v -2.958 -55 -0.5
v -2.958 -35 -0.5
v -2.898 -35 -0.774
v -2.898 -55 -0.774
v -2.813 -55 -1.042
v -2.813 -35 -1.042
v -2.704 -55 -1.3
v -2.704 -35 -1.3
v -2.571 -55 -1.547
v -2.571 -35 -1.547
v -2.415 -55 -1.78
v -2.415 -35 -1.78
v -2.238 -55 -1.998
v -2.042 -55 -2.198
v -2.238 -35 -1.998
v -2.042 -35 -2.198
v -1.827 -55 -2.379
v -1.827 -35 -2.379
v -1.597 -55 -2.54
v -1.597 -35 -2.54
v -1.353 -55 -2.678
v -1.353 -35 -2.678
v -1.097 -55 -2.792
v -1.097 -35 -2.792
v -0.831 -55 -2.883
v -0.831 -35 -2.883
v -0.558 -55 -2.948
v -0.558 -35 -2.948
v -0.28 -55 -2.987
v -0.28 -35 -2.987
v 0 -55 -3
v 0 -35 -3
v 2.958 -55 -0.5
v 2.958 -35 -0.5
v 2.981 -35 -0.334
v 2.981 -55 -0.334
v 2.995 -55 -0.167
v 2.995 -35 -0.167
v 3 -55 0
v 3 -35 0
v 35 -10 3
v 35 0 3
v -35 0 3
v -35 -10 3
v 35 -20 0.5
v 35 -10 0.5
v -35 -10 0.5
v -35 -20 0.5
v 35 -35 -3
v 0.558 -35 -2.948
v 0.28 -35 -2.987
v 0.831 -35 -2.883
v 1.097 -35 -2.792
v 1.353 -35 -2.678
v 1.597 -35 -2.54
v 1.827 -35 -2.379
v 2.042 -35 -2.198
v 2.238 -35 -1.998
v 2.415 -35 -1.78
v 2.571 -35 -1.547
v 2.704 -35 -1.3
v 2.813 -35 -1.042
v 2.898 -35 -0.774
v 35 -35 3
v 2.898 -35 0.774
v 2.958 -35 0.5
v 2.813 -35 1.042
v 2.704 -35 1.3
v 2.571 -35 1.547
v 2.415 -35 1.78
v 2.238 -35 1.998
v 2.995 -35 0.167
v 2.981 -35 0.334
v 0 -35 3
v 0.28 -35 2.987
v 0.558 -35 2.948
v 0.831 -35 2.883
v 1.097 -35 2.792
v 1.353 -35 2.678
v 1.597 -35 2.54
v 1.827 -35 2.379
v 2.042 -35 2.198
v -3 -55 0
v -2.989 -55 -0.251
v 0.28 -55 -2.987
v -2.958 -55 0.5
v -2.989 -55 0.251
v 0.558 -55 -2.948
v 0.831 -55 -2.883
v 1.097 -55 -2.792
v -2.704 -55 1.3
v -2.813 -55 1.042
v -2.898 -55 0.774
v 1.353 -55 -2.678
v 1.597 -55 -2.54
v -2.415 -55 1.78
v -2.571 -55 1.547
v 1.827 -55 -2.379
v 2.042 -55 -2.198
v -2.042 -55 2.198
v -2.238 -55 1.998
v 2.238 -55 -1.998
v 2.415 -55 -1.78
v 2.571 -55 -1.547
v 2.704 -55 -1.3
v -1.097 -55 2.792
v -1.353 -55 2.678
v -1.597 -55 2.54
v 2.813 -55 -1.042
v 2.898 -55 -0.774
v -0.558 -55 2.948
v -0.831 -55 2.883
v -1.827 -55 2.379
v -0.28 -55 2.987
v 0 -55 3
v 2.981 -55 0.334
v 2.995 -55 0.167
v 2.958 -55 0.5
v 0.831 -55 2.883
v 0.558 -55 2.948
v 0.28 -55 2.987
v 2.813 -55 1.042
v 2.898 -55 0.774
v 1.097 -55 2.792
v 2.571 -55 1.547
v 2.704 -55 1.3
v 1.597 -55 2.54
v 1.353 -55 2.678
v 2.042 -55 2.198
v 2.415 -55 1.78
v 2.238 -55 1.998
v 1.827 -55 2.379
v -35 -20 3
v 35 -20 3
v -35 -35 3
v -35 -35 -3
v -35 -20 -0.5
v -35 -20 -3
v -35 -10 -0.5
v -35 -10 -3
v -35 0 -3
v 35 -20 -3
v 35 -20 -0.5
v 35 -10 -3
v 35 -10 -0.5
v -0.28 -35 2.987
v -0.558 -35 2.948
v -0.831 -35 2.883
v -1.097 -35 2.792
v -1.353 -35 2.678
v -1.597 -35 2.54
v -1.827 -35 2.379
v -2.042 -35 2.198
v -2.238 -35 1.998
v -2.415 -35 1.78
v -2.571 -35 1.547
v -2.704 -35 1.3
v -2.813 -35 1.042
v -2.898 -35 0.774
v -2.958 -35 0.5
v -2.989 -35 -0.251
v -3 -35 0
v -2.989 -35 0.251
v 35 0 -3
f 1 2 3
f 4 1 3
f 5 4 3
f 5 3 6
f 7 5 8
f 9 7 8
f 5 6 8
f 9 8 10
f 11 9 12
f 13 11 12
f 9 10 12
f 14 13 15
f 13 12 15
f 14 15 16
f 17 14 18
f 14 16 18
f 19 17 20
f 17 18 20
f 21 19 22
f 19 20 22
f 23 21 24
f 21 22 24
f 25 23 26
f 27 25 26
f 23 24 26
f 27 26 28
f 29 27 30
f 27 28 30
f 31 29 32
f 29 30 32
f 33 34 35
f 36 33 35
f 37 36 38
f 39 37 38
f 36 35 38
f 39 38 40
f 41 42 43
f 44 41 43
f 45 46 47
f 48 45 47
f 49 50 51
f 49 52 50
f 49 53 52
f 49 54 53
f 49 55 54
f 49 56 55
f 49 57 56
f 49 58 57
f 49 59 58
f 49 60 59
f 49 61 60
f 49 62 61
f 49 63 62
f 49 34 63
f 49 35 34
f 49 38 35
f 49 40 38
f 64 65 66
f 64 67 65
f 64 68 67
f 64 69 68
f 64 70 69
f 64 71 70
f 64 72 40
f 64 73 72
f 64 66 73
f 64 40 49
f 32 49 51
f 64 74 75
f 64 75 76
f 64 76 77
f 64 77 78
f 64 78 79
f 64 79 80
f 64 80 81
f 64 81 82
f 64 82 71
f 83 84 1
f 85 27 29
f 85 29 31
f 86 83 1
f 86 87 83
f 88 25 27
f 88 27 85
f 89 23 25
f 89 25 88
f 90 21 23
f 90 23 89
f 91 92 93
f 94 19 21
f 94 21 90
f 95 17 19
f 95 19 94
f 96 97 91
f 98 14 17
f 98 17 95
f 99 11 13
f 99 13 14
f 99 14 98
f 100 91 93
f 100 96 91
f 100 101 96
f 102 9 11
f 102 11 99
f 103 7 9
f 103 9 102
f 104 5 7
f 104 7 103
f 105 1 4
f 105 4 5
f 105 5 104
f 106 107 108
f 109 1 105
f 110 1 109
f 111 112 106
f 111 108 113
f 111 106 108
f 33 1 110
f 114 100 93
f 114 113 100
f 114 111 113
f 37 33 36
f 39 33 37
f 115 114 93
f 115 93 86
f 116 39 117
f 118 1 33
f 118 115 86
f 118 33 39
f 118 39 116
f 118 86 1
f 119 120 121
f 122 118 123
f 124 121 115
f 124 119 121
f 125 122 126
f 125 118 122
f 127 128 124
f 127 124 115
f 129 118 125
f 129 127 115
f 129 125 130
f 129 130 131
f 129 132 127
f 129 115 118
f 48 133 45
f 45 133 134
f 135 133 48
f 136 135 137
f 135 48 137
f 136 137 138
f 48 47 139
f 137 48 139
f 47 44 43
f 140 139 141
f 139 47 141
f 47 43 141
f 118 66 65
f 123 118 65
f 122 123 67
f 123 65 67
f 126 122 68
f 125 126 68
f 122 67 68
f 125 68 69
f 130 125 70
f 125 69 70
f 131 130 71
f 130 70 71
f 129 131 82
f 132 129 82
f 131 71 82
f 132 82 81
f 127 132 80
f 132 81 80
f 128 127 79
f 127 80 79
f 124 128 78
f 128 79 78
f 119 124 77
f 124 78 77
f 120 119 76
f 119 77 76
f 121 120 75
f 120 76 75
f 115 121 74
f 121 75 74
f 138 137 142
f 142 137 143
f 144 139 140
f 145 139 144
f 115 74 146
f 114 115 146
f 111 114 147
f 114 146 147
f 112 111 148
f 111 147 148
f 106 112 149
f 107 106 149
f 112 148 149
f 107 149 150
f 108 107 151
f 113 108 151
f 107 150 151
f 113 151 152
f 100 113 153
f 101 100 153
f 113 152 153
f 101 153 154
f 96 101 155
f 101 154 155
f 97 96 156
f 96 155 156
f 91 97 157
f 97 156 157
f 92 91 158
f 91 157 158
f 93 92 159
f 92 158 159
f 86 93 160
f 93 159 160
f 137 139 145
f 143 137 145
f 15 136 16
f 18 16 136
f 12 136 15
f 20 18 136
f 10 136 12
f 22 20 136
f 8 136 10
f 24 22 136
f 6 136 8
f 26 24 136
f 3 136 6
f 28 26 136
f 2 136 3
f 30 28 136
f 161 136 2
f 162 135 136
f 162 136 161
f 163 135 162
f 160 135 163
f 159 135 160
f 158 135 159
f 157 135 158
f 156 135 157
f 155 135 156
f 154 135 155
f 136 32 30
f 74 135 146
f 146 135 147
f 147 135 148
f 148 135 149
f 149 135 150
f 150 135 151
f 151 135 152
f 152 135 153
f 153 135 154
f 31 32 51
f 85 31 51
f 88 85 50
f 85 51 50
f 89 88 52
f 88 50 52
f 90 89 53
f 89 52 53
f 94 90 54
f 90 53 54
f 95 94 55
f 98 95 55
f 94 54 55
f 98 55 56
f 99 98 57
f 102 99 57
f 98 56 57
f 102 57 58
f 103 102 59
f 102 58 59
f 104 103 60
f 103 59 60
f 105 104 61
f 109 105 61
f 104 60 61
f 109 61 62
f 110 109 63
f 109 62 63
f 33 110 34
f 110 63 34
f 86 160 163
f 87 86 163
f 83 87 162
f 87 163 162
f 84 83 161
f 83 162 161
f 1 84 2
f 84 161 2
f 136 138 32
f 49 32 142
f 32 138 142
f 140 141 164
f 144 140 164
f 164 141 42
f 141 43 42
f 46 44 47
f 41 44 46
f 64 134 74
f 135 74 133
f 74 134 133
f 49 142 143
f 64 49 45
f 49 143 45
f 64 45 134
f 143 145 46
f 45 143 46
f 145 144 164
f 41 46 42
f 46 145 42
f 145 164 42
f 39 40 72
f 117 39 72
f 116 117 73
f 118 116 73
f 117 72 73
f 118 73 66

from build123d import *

# Parameters (mm, degrees)
F1_DEPTH = 10
F2_START = 10
F2_DEPTH = 10
F3_START = 20
F3_DEPTH = 15
F4_START = 35
F4_DEPTH = 20


with BuildPart() as f1:
    # F0 (on Front) → F1 (new body)
    with BuildSketch(Plane.XZ):
        with BuildLine():
            Line((1.12e-08, 3), (-35, 3))
            Line((-35, 3), (-35, 0.5))
            Line((-35, 0.5), (-2.9580398915, 0.5))
            ThreePointArc((-2.9580398915, 0.5), (-1.9364916688, 2.2912878511), (1.12e-08, 3))
        make_face()
        with BuildLine():
            Line((-2.9580398915, 0.5), (-35, 0.5))
            Line((-35, 0.5), (-35, -0.5))
            Line((-35, -0.5), (-2.9580398915, -0.5))
            ThreePointArc((-2.9580398915, -0.5), (-3, 0), (-2.9580398915, 0.5))
        make_face()
        with BuildLine():
            Line((-2.9580398915, -0.5), (-35, -0.5))
            Line((-35, -0.5), (-35, -3))
            Line((-35, -3), (1.44e-08, -3))
            ThreePointArc((1.44e-08, -3), (-1.9364916676, -2.2912878521), (-2.9580398915, -0.5))
        make_face()
        with BuildLine():
            Line((2.9580398915, -0.5), (-2.9580398915, -0.5))
            ThreePointArc((-2.9580398915, -0.5), (-1.9364916676, -2.2912878521), (1.44e-08, -3))
            ThreePointArc((1.44e-08, -3), (1.9364916786, -2.2912878428), (2.9580398915, -0.5))
        make_face()
        with BuildLine():
            ThreePointArc((2.9580398915, 0.5), (1.9364916774, 2.2912878439), (1.12e-08, 3))
            ThreePointArc((1.12e-08, 3), (-1.9364916688, 2.2912878511), (-2.9580398915, 0.5))
            Line((-2.9580398915, 0.5), (2.9580398915, 0.5))
        make_face()
        with BuildLine():
            Line((35, 3), (1.12e-08, 3))
            ThreePointArc((1.12e-08, 3), (1.9364916774, 2.2912878439), (2.9580398915, 0.5))
            Line((2.9580398915, 0.5), (35, 0.5))
            Line((35, 0.5), (35, 3))
        make_face()
        with BuildLine():
            Line((35, 0.5), (2.9580398915, 0.5))
            ThreePointArc((2.9580398915, 0.5), (2.9894915684, 0.2508787808), (3, 0))
            ThreePointArc((3, 0), (2.9894915684, -0.2508787808), (2.9580398915, -0.5))
            Line((2.9580398915, -0.5), (35, -0.5))
            Line((35, -0.5), (35, 0.5))
        make_face()
        with BuildLine():
            Line((35, -3), (35, -0.5))
            Line((35, -0.5), (2.9580398915, -0.5))
            ThreePointArc((2.9580398915, -0.5), (1.9364916786, -2.2912878428), (1.44e-08, -3))
            Line((1.44e-08, -3), (35, -3))
        make_face()
        with BuildLine():
            ThreePointArc((3, 0), (2.9894915684, 0.2508787808), (2.9580398915, 0.5))
            Line((2.9580398915, 0.5), (-2.9580398915, 0.5))
            ThreePointArc((-2.9580398915, 0.5), (-3, 0), (-2.9580398915, -0.5))
            Line((-2.9580398915, -0.5), (2.9580398915, -0.5))
            ThreePointArc((2.9580398915, -0.5), (2.9894915684, -0.2508787808), (3, 0))
        make_face()
    extrude(amount=F1_DEPTH)

    # F0 (on Front) → F2 (join)
    with BuildSketch(Plane.XZ.offset(F2_START)):
        with BuildLine():
            Line((-2.9580398915, 0.5), (-35, 0.5))
            Line((-35, 0.5), (-35, -0.5))
            Line((-35, -0.5), (-2.9580398915, -0.5))
            ThreePointArc((-2.9580398915, -0.5), (-3, 0), (-2.9580398915, 0.5))
        make_face()
        with BuildLine():
            ThreePointArc((3, 0), (2.9894915684, 0.2508787808), (2.9580398915, 0.5))
            Line((2.9580398915, 0.5), (-2.9580398915, 0.5))
            ThreePointArc((-2.9580398915, 0.5), (-3, 0), (-2.9580398915, -0.5))
            Line((-2.9580398915, -0.5), (2.9580398915, -0.5))
            ThreePointArc((2.9580398915, -0.5), (2.9894915684, -0.2508787808), (3, 0))
        make_face()
        with BuildLine():
            Line((35, 0.5), (2.9580398915, 0.5))
            ThreePointArc((2.9580398915, 0.5), (2.9894915684, 0.2508787808), (3, 0))
            ThreePointArc((3, 0), (2.9894915684, -0.2508787808), (2.9580398915, -0.5))
            Line((2.9580398915, -0.5), (35, -0.5))
            Line((35, -0.5), (35, 0.5))
        make_face()
    extrude(amount=F2_DEPTH)

    # F0 (on Front) → F3 (join)
    with BuildSketch(Plane.XZ.offset(F3_START)):
        with BuildLine():
            Line((35, 3), (1.12e-08, 3))
            ThreePointArc((1.12e-08, 3), (1.9364916774, 2.2912878439), (2.9580398915, 0.5))
            Line((2.9580398915, 0.5), (35, 0.5))
            Line((35, 0.5), (35, 3))
        make_face()
        with BuildLine():
            Line((35, 0.5), (2.9580398915, 0.5))
            ThreePointArc((2.9580398915, 0.5), (2.9894915684, 0.2508787808), (3, 0))
            ThreePointArc((3, 0), (2.9894915684, -0.2508787808), (2.9580398915, -0.5))
            Line((2.9580398915, -0.5), (35, -0.5))
            Line((35, -0.5), (35, 0.5))
        make_face()
        with BuildLine():
            Line((35, -3), (35, -0.5))
            Line((35, -0.5), (2.9580398915, -0.5))
            ThreePointArc((2.9580398915, -0.5), (1.9364916786, -2.2912878428), (1.44e-08, -3))
            Line((1.44e-08, -3), (35, -3))
        make_face()
        with BuildLine():
            Line((-2.9580398915, -0.5), (-35, -0.5))
            Line((-35, -0.5), (-35, -3))
            Line((-35, -3), (1.44e-08, -3))
            ThreePointArc((1.44e-08, -3), (-1.9364916676, -2.2912878521), (-2.9580398915, -0.5))
        make_face()
        with BuildLine():
            Line((1.12e-08, 3), (-35, 3))
            Line((-35, 3), (-35, 0.5))
            Line((-35, 0.5), (-2.9580398915, 0.5))
            ThreePointArc((-2.9580398915, 0.5), (-1.9364916688, 2.2912878511), (1.12e-08, 3))
        make_face()
        with BuildLine():
            Line((-2.9580398915, 0.5), (-35, 0.5))
            Line((-35, 0.5), (-35, -0.5))
            Line((-35, -0.5), (-2.9580398915, -0.5))
            ThreePointArc((-2.9580398915, -0.5), (-3, 0), (-2.9580398915, 0.5))
        make_face()
        with BuildLine():
            ThreePointArc((2.9580398915, 0.5), (1.9364916774, 2.2912878439), (1.12e-08, 3))
            ThreePointArc((1.12e-08, 3), (-1.9364916688, 2.2912878511), (-2.9580398915, 0.5))
            Line((-2.9580398915, 0.5), (2.9580398915, 0.5))
        make_face()
        with BuildLine():
            ThreePointArc((3, 0), (2.9894915684, 0.2508787808), (2.9580398915, 0.5))
            Line((2.9580398915, 0.5), (-2.9580398915, 0.5))
            ThreePointArc((-2.9580398915, 0.5), (-3, 0), (-2.9580398915, -0.5))
            Line((-2.9580398915, -0.5), (2.9580398915, -0.5))
            ThreePointArc((2.9580398915, -0.5), (2.9894915684, -0.2508787808), (3, 0))
        make_face()
        with BuildLine():
            Line((2.9580398915, -0.5), (-2.9580398915, -0.5))
            ThreePointArc((-2.9580398915, -0.5), (-1.9364916676, -2.2912878521), (1.44e-08, -3))
            ThreePointArc((1.44e-08, -3), (1.9364916786, -2.2912878428), (2.9580398915, -0.5))
        make_face()
    extrude(amount=F3_DEPTH)

    # F0 (on Front) → F4 (join)
    with BuildSketch(Plane.XZ.offset(F4_START)):
        with BuildLine():
            Line((2.9580398915, -0.5), (-2.9580398915, -0.5))
            ThreePointArc((-2.9580398915, -0.5), (-1.9364916676, -2.2912878521), (1.44e-08, -3))
            ThreePointArc((1.44e-08, -3), (1.9364916786, -2.2912878428), (2.9580398915, -0.5))
        make_face()
        with BuildLine():
            ThreePointArc((3, 0), (2.9894915684, 0.2508787808), (2.9580398915, 0.5))
            Line((2.9580398915, 0.5), (-2.9580398915, 0.5))
            ThreePointArc((-2.9580398915, 0.5), (-3, 0), (-2.9580398915, -0.5))
            Line((-2.9580398915, -0.5), (2.9580398915, -0.5))
            ThreePointArc((2.9580398915, -0.5), (2.9894915684, -0.2508787808), (3, 0))
        make_face()
        with BuildLine():
            ThreePointArc((2.9580398915, 0.5), (1.9364916774, 2.2912878439), (1.12e-08, 3))
            ThreePointArc((1.12e-08, 3), (-1.9364916688, 2.2912878511), (-2.9580398915, 0.5))
            Line((-2.9580398915, 0.5), (2.9580398915, 0.5))
        make_face()
    extrude(amount=F4_DEPTH)


solid = f1.part
